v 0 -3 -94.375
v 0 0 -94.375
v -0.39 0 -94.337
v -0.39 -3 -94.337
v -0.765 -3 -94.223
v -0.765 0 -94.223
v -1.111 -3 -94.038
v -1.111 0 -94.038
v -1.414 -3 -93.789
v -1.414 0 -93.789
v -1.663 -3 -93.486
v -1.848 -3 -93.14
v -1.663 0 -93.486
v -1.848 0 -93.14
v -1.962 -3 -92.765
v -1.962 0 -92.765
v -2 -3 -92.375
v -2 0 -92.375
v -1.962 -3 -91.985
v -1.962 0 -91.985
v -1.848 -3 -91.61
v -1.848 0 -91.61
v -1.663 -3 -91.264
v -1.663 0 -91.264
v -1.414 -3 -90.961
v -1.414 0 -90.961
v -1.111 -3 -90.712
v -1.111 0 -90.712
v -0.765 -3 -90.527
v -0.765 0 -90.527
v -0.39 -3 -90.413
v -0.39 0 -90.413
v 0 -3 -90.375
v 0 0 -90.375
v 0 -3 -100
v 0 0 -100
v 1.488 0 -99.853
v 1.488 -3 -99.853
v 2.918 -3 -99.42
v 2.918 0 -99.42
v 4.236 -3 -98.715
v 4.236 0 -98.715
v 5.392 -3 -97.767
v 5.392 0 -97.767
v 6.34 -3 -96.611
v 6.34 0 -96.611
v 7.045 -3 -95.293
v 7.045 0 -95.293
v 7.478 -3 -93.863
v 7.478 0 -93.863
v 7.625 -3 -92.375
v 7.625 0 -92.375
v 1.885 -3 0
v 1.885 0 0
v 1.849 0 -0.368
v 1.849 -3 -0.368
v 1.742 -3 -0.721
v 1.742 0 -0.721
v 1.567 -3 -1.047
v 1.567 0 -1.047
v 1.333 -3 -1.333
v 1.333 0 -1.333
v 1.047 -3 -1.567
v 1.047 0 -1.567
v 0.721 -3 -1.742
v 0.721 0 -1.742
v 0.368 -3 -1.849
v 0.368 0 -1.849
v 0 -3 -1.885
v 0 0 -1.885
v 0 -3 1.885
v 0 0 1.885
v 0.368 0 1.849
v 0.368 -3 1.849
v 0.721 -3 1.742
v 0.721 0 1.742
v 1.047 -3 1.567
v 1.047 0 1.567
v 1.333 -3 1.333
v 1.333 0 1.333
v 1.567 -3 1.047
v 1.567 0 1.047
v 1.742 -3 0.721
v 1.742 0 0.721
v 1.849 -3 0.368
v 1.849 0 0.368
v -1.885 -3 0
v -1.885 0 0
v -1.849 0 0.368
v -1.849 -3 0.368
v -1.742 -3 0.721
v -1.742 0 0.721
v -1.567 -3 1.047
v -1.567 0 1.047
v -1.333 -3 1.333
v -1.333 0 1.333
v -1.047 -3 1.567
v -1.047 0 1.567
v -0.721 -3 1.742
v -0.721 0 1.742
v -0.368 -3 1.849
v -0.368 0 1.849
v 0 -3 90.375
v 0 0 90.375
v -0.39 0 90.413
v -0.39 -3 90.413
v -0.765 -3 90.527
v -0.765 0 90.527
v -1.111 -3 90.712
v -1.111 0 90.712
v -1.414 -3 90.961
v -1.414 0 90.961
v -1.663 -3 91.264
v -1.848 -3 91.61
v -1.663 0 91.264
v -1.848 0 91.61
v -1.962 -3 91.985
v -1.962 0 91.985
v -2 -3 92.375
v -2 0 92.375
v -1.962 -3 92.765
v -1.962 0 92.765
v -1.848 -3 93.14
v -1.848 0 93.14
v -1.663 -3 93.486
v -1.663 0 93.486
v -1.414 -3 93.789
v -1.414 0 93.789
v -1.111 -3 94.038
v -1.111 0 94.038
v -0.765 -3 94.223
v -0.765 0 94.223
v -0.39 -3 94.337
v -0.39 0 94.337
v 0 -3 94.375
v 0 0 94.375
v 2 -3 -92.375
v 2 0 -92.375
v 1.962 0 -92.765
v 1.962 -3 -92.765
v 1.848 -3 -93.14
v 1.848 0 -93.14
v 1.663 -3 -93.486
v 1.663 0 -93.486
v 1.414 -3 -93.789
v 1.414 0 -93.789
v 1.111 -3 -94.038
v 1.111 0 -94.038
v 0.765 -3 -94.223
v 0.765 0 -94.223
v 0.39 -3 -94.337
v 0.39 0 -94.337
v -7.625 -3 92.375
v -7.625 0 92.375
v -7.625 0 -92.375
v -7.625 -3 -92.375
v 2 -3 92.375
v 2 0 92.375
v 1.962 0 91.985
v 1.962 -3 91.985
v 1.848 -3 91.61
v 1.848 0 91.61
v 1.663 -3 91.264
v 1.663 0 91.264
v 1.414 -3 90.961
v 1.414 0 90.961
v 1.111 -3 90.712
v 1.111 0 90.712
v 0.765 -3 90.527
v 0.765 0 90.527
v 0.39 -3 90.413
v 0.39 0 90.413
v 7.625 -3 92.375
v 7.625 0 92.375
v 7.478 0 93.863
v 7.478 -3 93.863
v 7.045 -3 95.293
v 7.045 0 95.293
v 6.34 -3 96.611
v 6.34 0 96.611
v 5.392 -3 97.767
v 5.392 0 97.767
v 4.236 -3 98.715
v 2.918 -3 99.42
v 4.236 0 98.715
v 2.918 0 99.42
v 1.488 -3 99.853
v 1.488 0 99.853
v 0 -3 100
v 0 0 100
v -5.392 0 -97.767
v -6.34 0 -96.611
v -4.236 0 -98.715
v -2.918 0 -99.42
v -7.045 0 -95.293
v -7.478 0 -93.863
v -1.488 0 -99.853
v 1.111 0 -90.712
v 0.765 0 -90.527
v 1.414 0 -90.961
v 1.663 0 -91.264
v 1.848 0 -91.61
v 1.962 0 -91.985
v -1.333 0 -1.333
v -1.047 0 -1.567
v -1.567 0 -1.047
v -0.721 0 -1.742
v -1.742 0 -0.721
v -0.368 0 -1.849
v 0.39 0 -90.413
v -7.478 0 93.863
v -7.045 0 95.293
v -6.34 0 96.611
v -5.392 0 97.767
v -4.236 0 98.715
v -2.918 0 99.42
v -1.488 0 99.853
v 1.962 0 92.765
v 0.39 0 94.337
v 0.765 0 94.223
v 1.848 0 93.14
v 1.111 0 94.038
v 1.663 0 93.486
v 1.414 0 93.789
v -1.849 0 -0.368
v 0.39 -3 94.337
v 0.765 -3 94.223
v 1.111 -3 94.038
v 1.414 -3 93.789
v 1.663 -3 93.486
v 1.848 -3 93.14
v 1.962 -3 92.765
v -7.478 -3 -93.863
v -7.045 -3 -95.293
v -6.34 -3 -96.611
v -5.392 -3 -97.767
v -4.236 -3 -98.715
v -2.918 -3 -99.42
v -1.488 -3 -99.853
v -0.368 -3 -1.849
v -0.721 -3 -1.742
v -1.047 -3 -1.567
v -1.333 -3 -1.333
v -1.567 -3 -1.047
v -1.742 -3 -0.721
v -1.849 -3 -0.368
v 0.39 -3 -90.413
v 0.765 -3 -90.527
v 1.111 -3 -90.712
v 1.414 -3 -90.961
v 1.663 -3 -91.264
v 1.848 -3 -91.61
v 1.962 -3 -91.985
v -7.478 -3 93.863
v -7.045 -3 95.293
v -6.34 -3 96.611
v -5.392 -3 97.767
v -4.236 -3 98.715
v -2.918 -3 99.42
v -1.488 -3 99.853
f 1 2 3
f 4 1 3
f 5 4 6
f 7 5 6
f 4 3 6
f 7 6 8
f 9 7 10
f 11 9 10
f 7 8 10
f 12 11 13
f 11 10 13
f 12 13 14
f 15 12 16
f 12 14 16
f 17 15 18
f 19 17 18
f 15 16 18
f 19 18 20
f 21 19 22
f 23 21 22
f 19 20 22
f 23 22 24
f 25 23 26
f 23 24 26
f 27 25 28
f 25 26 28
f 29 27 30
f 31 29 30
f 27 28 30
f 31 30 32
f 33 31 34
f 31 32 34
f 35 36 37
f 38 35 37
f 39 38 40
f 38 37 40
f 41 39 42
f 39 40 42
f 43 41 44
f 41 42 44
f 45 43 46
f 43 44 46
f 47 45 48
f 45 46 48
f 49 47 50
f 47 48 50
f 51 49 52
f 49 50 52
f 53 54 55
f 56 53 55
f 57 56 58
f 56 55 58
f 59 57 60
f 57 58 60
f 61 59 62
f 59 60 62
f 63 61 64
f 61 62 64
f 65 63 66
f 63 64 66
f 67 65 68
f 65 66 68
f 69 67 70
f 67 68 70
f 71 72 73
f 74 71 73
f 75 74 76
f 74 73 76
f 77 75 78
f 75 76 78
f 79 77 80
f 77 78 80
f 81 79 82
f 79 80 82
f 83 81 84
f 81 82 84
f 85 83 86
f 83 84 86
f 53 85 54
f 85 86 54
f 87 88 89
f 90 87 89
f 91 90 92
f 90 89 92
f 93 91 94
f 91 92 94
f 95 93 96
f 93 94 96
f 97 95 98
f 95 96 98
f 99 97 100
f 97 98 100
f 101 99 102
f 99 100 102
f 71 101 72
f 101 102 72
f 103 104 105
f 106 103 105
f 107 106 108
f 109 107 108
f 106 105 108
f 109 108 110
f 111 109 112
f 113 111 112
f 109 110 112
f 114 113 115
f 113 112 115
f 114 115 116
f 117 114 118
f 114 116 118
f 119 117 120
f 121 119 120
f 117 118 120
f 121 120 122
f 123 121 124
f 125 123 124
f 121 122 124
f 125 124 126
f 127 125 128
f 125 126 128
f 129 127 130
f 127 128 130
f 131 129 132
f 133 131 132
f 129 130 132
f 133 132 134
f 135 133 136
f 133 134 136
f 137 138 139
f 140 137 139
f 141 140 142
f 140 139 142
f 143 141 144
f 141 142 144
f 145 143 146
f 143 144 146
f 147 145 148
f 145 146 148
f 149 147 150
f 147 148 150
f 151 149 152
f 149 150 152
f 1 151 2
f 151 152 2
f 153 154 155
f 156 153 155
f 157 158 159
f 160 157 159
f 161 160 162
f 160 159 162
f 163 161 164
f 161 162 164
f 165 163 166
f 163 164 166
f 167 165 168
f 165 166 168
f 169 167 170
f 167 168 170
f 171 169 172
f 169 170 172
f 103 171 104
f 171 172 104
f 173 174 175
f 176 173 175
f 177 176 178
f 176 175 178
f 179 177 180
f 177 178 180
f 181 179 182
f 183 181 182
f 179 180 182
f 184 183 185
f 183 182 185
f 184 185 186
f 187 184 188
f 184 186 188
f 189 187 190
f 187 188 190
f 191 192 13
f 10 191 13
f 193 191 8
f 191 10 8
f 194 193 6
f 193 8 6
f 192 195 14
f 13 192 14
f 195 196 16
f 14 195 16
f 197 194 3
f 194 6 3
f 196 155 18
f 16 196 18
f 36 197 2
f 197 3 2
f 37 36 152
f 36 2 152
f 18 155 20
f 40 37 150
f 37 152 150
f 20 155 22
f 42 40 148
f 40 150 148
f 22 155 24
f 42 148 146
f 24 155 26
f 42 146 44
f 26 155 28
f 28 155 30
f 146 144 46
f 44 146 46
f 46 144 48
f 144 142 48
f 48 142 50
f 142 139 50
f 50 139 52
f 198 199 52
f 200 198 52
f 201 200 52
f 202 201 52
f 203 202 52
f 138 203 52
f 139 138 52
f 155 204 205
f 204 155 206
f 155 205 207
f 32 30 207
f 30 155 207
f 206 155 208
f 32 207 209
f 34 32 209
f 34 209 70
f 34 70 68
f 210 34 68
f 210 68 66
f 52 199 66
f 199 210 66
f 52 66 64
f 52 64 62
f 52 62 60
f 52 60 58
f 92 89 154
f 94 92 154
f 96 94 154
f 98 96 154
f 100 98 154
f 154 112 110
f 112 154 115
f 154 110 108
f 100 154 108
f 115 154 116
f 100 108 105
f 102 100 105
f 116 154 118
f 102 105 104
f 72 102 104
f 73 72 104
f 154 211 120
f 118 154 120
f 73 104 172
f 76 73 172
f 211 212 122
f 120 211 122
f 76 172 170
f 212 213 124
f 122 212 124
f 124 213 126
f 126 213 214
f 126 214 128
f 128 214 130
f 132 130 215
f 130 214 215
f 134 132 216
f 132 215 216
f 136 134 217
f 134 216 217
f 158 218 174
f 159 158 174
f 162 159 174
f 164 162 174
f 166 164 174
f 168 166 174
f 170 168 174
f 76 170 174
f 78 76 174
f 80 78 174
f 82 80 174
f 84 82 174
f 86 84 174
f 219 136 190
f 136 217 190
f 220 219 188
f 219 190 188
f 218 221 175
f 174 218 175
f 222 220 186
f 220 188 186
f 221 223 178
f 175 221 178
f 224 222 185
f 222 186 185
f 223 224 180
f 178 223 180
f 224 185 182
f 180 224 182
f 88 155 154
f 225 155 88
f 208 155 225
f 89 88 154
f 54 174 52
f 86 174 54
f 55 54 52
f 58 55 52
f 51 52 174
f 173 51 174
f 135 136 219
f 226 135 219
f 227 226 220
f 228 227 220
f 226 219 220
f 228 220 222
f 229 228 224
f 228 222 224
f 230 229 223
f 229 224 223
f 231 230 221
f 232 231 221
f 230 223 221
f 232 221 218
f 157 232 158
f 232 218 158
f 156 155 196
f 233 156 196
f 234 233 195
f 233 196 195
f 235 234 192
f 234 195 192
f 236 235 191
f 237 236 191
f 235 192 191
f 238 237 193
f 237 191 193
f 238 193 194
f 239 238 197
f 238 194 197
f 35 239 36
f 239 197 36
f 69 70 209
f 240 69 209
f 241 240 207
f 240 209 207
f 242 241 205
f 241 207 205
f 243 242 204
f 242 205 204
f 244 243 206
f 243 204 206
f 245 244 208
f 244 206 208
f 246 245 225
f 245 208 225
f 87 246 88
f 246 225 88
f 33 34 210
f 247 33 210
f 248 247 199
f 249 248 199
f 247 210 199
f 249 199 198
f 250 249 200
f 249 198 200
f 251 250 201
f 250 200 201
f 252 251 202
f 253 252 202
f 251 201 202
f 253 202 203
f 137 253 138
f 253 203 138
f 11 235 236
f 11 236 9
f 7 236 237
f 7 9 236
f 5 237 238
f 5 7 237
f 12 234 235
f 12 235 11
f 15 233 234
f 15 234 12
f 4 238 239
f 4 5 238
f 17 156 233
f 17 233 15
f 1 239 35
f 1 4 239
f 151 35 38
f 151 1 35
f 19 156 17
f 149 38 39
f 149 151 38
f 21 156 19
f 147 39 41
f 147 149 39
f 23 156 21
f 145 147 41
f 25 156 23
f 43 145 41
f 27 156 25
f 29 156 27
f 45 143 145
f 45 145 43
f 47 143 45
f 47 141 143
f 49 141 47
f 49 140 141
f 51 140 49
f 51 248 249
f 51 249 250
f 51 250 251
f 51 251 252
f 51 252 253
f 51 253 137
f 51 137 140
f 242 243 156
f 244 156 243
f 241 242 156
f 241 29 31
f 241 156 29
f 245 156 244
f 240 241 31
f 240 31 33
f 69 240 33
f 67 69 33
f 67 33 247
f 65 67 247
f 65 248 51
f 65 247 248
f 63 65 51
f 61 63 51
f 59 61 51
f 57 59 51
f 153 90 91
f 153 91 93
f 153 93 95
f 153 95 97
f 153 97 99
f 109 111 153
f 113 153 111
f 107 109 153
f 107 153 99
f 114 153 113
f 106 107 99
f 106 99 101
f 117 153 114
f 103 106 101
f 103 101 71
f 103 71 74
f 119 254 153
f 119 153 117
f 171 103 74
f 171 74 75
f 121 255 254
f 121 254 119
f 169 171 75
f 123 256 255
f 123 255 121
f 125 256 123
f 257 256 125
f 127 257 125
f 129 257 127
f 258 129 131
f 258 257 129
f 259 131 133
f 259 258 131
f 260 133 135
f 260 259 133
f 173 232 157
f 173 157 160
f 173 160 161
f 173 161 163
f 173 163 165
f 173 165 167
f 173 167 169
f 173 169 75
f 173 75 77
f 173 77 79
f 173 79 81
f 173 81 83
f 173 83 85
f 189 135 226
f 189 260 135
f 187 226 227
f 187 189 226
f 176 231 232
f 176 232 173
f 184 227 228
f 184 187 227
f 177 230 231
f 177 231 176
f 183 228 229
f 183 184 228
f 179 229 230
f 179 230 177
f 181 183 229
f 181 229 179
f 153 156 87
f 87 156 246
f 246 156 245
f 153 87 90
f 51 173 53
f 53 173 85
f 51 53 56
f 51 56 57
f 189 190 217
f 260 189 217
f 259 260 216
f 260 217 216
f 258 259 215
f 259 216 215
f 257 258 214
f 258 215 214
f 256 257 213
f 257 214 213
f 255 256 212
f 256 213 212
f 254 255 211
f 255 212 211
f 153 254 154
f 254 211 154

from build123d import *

# Parameters (mm, degrees)
F1_DEPTH = 3


with BuildPart() as f1:
    # F0 (on Front) → F1 (new body)
    with BuildSketch(Plane.XZ):
        with BuildLine():
            ThreePointArc((0, 100), (-5.391689, 97.766689), (-7.625, 92.375))
            Line((-7.625, 92.375), (-7.625, 0))
            Line((-7.625, 0), (-1.885, 0))
            ThreePointArc((-1.885, 0), (-1.332896, 1.332896), (0, 1.885))
            Line((0, 1.885), (0, 90.375))
            ThreePointArc((0, 90.375), (-2, 92.375), (0, 94.375))
            Line((0, 94.375), (0, 100))
        make_face()
        with BuildLine():
            ThreePointArc((7.625, 92.375), (5.391689, 97.766689), (0, 100))
            Line((0, 100), (0, 94.375))
            ThreePointArc((0, 94.375), (1.414214, 93.789214), (2, 92.375))
            ThreePointArc((2, 92.375), (1.414214, 90.960786), (0, 90.375))
            Line((0, 90.375), (0, 1.885))
            ThreePointArc((0, 1.885), (1.332896, 1.332896), (1.885, 0))
            Line((1.885, 0), (7.625, 0))
            Line((7.625, 0), (7.625, 92.375))
        make_face()
        with BuildLine():
            Line((-1.885, 0), (-7.625, 0))
            Line((-7.625, 0), (-7.625, -92.375))
            ThreePointArc((-7.625, -92.375), (-5.391689, -97.766689), (0, -100))
            Line((0, -100), (0, -94.375))
            ThreePointArc((0, -94.375), (-2, -92.375), (0, -90.375))
            Line((0, -90.375), (0, -1.885))
            ThreePointArc((0, -1.885), (-1.332896, -1.332896), (-1.885, 0))
        make_face()
        with BuildLine():
            Line((0, -94.375), (0, -100))
            ThreePointArc((0, -100), (5.391689, -97.766689), (7.625, -92.375))
            Line((7.625, -92.375), (7.625, 0))
            Line((7.625, 0), (1.885, 0))
            ThreePointArc((1.885, 0), (1.332896, -1.332896), (0, -1.885))
            Line((0, -1.885), (0, -90.375))
            ThreePointArc((0, -90.375), (1.414214, -90.960786), (2, -92.375))
            ThreePointArc((2, -92.375), (1.414214, -93.789214), (0, -94.375))
        make_face()
    extrude(amount=F1_DEPTH)


solid = f1.part
